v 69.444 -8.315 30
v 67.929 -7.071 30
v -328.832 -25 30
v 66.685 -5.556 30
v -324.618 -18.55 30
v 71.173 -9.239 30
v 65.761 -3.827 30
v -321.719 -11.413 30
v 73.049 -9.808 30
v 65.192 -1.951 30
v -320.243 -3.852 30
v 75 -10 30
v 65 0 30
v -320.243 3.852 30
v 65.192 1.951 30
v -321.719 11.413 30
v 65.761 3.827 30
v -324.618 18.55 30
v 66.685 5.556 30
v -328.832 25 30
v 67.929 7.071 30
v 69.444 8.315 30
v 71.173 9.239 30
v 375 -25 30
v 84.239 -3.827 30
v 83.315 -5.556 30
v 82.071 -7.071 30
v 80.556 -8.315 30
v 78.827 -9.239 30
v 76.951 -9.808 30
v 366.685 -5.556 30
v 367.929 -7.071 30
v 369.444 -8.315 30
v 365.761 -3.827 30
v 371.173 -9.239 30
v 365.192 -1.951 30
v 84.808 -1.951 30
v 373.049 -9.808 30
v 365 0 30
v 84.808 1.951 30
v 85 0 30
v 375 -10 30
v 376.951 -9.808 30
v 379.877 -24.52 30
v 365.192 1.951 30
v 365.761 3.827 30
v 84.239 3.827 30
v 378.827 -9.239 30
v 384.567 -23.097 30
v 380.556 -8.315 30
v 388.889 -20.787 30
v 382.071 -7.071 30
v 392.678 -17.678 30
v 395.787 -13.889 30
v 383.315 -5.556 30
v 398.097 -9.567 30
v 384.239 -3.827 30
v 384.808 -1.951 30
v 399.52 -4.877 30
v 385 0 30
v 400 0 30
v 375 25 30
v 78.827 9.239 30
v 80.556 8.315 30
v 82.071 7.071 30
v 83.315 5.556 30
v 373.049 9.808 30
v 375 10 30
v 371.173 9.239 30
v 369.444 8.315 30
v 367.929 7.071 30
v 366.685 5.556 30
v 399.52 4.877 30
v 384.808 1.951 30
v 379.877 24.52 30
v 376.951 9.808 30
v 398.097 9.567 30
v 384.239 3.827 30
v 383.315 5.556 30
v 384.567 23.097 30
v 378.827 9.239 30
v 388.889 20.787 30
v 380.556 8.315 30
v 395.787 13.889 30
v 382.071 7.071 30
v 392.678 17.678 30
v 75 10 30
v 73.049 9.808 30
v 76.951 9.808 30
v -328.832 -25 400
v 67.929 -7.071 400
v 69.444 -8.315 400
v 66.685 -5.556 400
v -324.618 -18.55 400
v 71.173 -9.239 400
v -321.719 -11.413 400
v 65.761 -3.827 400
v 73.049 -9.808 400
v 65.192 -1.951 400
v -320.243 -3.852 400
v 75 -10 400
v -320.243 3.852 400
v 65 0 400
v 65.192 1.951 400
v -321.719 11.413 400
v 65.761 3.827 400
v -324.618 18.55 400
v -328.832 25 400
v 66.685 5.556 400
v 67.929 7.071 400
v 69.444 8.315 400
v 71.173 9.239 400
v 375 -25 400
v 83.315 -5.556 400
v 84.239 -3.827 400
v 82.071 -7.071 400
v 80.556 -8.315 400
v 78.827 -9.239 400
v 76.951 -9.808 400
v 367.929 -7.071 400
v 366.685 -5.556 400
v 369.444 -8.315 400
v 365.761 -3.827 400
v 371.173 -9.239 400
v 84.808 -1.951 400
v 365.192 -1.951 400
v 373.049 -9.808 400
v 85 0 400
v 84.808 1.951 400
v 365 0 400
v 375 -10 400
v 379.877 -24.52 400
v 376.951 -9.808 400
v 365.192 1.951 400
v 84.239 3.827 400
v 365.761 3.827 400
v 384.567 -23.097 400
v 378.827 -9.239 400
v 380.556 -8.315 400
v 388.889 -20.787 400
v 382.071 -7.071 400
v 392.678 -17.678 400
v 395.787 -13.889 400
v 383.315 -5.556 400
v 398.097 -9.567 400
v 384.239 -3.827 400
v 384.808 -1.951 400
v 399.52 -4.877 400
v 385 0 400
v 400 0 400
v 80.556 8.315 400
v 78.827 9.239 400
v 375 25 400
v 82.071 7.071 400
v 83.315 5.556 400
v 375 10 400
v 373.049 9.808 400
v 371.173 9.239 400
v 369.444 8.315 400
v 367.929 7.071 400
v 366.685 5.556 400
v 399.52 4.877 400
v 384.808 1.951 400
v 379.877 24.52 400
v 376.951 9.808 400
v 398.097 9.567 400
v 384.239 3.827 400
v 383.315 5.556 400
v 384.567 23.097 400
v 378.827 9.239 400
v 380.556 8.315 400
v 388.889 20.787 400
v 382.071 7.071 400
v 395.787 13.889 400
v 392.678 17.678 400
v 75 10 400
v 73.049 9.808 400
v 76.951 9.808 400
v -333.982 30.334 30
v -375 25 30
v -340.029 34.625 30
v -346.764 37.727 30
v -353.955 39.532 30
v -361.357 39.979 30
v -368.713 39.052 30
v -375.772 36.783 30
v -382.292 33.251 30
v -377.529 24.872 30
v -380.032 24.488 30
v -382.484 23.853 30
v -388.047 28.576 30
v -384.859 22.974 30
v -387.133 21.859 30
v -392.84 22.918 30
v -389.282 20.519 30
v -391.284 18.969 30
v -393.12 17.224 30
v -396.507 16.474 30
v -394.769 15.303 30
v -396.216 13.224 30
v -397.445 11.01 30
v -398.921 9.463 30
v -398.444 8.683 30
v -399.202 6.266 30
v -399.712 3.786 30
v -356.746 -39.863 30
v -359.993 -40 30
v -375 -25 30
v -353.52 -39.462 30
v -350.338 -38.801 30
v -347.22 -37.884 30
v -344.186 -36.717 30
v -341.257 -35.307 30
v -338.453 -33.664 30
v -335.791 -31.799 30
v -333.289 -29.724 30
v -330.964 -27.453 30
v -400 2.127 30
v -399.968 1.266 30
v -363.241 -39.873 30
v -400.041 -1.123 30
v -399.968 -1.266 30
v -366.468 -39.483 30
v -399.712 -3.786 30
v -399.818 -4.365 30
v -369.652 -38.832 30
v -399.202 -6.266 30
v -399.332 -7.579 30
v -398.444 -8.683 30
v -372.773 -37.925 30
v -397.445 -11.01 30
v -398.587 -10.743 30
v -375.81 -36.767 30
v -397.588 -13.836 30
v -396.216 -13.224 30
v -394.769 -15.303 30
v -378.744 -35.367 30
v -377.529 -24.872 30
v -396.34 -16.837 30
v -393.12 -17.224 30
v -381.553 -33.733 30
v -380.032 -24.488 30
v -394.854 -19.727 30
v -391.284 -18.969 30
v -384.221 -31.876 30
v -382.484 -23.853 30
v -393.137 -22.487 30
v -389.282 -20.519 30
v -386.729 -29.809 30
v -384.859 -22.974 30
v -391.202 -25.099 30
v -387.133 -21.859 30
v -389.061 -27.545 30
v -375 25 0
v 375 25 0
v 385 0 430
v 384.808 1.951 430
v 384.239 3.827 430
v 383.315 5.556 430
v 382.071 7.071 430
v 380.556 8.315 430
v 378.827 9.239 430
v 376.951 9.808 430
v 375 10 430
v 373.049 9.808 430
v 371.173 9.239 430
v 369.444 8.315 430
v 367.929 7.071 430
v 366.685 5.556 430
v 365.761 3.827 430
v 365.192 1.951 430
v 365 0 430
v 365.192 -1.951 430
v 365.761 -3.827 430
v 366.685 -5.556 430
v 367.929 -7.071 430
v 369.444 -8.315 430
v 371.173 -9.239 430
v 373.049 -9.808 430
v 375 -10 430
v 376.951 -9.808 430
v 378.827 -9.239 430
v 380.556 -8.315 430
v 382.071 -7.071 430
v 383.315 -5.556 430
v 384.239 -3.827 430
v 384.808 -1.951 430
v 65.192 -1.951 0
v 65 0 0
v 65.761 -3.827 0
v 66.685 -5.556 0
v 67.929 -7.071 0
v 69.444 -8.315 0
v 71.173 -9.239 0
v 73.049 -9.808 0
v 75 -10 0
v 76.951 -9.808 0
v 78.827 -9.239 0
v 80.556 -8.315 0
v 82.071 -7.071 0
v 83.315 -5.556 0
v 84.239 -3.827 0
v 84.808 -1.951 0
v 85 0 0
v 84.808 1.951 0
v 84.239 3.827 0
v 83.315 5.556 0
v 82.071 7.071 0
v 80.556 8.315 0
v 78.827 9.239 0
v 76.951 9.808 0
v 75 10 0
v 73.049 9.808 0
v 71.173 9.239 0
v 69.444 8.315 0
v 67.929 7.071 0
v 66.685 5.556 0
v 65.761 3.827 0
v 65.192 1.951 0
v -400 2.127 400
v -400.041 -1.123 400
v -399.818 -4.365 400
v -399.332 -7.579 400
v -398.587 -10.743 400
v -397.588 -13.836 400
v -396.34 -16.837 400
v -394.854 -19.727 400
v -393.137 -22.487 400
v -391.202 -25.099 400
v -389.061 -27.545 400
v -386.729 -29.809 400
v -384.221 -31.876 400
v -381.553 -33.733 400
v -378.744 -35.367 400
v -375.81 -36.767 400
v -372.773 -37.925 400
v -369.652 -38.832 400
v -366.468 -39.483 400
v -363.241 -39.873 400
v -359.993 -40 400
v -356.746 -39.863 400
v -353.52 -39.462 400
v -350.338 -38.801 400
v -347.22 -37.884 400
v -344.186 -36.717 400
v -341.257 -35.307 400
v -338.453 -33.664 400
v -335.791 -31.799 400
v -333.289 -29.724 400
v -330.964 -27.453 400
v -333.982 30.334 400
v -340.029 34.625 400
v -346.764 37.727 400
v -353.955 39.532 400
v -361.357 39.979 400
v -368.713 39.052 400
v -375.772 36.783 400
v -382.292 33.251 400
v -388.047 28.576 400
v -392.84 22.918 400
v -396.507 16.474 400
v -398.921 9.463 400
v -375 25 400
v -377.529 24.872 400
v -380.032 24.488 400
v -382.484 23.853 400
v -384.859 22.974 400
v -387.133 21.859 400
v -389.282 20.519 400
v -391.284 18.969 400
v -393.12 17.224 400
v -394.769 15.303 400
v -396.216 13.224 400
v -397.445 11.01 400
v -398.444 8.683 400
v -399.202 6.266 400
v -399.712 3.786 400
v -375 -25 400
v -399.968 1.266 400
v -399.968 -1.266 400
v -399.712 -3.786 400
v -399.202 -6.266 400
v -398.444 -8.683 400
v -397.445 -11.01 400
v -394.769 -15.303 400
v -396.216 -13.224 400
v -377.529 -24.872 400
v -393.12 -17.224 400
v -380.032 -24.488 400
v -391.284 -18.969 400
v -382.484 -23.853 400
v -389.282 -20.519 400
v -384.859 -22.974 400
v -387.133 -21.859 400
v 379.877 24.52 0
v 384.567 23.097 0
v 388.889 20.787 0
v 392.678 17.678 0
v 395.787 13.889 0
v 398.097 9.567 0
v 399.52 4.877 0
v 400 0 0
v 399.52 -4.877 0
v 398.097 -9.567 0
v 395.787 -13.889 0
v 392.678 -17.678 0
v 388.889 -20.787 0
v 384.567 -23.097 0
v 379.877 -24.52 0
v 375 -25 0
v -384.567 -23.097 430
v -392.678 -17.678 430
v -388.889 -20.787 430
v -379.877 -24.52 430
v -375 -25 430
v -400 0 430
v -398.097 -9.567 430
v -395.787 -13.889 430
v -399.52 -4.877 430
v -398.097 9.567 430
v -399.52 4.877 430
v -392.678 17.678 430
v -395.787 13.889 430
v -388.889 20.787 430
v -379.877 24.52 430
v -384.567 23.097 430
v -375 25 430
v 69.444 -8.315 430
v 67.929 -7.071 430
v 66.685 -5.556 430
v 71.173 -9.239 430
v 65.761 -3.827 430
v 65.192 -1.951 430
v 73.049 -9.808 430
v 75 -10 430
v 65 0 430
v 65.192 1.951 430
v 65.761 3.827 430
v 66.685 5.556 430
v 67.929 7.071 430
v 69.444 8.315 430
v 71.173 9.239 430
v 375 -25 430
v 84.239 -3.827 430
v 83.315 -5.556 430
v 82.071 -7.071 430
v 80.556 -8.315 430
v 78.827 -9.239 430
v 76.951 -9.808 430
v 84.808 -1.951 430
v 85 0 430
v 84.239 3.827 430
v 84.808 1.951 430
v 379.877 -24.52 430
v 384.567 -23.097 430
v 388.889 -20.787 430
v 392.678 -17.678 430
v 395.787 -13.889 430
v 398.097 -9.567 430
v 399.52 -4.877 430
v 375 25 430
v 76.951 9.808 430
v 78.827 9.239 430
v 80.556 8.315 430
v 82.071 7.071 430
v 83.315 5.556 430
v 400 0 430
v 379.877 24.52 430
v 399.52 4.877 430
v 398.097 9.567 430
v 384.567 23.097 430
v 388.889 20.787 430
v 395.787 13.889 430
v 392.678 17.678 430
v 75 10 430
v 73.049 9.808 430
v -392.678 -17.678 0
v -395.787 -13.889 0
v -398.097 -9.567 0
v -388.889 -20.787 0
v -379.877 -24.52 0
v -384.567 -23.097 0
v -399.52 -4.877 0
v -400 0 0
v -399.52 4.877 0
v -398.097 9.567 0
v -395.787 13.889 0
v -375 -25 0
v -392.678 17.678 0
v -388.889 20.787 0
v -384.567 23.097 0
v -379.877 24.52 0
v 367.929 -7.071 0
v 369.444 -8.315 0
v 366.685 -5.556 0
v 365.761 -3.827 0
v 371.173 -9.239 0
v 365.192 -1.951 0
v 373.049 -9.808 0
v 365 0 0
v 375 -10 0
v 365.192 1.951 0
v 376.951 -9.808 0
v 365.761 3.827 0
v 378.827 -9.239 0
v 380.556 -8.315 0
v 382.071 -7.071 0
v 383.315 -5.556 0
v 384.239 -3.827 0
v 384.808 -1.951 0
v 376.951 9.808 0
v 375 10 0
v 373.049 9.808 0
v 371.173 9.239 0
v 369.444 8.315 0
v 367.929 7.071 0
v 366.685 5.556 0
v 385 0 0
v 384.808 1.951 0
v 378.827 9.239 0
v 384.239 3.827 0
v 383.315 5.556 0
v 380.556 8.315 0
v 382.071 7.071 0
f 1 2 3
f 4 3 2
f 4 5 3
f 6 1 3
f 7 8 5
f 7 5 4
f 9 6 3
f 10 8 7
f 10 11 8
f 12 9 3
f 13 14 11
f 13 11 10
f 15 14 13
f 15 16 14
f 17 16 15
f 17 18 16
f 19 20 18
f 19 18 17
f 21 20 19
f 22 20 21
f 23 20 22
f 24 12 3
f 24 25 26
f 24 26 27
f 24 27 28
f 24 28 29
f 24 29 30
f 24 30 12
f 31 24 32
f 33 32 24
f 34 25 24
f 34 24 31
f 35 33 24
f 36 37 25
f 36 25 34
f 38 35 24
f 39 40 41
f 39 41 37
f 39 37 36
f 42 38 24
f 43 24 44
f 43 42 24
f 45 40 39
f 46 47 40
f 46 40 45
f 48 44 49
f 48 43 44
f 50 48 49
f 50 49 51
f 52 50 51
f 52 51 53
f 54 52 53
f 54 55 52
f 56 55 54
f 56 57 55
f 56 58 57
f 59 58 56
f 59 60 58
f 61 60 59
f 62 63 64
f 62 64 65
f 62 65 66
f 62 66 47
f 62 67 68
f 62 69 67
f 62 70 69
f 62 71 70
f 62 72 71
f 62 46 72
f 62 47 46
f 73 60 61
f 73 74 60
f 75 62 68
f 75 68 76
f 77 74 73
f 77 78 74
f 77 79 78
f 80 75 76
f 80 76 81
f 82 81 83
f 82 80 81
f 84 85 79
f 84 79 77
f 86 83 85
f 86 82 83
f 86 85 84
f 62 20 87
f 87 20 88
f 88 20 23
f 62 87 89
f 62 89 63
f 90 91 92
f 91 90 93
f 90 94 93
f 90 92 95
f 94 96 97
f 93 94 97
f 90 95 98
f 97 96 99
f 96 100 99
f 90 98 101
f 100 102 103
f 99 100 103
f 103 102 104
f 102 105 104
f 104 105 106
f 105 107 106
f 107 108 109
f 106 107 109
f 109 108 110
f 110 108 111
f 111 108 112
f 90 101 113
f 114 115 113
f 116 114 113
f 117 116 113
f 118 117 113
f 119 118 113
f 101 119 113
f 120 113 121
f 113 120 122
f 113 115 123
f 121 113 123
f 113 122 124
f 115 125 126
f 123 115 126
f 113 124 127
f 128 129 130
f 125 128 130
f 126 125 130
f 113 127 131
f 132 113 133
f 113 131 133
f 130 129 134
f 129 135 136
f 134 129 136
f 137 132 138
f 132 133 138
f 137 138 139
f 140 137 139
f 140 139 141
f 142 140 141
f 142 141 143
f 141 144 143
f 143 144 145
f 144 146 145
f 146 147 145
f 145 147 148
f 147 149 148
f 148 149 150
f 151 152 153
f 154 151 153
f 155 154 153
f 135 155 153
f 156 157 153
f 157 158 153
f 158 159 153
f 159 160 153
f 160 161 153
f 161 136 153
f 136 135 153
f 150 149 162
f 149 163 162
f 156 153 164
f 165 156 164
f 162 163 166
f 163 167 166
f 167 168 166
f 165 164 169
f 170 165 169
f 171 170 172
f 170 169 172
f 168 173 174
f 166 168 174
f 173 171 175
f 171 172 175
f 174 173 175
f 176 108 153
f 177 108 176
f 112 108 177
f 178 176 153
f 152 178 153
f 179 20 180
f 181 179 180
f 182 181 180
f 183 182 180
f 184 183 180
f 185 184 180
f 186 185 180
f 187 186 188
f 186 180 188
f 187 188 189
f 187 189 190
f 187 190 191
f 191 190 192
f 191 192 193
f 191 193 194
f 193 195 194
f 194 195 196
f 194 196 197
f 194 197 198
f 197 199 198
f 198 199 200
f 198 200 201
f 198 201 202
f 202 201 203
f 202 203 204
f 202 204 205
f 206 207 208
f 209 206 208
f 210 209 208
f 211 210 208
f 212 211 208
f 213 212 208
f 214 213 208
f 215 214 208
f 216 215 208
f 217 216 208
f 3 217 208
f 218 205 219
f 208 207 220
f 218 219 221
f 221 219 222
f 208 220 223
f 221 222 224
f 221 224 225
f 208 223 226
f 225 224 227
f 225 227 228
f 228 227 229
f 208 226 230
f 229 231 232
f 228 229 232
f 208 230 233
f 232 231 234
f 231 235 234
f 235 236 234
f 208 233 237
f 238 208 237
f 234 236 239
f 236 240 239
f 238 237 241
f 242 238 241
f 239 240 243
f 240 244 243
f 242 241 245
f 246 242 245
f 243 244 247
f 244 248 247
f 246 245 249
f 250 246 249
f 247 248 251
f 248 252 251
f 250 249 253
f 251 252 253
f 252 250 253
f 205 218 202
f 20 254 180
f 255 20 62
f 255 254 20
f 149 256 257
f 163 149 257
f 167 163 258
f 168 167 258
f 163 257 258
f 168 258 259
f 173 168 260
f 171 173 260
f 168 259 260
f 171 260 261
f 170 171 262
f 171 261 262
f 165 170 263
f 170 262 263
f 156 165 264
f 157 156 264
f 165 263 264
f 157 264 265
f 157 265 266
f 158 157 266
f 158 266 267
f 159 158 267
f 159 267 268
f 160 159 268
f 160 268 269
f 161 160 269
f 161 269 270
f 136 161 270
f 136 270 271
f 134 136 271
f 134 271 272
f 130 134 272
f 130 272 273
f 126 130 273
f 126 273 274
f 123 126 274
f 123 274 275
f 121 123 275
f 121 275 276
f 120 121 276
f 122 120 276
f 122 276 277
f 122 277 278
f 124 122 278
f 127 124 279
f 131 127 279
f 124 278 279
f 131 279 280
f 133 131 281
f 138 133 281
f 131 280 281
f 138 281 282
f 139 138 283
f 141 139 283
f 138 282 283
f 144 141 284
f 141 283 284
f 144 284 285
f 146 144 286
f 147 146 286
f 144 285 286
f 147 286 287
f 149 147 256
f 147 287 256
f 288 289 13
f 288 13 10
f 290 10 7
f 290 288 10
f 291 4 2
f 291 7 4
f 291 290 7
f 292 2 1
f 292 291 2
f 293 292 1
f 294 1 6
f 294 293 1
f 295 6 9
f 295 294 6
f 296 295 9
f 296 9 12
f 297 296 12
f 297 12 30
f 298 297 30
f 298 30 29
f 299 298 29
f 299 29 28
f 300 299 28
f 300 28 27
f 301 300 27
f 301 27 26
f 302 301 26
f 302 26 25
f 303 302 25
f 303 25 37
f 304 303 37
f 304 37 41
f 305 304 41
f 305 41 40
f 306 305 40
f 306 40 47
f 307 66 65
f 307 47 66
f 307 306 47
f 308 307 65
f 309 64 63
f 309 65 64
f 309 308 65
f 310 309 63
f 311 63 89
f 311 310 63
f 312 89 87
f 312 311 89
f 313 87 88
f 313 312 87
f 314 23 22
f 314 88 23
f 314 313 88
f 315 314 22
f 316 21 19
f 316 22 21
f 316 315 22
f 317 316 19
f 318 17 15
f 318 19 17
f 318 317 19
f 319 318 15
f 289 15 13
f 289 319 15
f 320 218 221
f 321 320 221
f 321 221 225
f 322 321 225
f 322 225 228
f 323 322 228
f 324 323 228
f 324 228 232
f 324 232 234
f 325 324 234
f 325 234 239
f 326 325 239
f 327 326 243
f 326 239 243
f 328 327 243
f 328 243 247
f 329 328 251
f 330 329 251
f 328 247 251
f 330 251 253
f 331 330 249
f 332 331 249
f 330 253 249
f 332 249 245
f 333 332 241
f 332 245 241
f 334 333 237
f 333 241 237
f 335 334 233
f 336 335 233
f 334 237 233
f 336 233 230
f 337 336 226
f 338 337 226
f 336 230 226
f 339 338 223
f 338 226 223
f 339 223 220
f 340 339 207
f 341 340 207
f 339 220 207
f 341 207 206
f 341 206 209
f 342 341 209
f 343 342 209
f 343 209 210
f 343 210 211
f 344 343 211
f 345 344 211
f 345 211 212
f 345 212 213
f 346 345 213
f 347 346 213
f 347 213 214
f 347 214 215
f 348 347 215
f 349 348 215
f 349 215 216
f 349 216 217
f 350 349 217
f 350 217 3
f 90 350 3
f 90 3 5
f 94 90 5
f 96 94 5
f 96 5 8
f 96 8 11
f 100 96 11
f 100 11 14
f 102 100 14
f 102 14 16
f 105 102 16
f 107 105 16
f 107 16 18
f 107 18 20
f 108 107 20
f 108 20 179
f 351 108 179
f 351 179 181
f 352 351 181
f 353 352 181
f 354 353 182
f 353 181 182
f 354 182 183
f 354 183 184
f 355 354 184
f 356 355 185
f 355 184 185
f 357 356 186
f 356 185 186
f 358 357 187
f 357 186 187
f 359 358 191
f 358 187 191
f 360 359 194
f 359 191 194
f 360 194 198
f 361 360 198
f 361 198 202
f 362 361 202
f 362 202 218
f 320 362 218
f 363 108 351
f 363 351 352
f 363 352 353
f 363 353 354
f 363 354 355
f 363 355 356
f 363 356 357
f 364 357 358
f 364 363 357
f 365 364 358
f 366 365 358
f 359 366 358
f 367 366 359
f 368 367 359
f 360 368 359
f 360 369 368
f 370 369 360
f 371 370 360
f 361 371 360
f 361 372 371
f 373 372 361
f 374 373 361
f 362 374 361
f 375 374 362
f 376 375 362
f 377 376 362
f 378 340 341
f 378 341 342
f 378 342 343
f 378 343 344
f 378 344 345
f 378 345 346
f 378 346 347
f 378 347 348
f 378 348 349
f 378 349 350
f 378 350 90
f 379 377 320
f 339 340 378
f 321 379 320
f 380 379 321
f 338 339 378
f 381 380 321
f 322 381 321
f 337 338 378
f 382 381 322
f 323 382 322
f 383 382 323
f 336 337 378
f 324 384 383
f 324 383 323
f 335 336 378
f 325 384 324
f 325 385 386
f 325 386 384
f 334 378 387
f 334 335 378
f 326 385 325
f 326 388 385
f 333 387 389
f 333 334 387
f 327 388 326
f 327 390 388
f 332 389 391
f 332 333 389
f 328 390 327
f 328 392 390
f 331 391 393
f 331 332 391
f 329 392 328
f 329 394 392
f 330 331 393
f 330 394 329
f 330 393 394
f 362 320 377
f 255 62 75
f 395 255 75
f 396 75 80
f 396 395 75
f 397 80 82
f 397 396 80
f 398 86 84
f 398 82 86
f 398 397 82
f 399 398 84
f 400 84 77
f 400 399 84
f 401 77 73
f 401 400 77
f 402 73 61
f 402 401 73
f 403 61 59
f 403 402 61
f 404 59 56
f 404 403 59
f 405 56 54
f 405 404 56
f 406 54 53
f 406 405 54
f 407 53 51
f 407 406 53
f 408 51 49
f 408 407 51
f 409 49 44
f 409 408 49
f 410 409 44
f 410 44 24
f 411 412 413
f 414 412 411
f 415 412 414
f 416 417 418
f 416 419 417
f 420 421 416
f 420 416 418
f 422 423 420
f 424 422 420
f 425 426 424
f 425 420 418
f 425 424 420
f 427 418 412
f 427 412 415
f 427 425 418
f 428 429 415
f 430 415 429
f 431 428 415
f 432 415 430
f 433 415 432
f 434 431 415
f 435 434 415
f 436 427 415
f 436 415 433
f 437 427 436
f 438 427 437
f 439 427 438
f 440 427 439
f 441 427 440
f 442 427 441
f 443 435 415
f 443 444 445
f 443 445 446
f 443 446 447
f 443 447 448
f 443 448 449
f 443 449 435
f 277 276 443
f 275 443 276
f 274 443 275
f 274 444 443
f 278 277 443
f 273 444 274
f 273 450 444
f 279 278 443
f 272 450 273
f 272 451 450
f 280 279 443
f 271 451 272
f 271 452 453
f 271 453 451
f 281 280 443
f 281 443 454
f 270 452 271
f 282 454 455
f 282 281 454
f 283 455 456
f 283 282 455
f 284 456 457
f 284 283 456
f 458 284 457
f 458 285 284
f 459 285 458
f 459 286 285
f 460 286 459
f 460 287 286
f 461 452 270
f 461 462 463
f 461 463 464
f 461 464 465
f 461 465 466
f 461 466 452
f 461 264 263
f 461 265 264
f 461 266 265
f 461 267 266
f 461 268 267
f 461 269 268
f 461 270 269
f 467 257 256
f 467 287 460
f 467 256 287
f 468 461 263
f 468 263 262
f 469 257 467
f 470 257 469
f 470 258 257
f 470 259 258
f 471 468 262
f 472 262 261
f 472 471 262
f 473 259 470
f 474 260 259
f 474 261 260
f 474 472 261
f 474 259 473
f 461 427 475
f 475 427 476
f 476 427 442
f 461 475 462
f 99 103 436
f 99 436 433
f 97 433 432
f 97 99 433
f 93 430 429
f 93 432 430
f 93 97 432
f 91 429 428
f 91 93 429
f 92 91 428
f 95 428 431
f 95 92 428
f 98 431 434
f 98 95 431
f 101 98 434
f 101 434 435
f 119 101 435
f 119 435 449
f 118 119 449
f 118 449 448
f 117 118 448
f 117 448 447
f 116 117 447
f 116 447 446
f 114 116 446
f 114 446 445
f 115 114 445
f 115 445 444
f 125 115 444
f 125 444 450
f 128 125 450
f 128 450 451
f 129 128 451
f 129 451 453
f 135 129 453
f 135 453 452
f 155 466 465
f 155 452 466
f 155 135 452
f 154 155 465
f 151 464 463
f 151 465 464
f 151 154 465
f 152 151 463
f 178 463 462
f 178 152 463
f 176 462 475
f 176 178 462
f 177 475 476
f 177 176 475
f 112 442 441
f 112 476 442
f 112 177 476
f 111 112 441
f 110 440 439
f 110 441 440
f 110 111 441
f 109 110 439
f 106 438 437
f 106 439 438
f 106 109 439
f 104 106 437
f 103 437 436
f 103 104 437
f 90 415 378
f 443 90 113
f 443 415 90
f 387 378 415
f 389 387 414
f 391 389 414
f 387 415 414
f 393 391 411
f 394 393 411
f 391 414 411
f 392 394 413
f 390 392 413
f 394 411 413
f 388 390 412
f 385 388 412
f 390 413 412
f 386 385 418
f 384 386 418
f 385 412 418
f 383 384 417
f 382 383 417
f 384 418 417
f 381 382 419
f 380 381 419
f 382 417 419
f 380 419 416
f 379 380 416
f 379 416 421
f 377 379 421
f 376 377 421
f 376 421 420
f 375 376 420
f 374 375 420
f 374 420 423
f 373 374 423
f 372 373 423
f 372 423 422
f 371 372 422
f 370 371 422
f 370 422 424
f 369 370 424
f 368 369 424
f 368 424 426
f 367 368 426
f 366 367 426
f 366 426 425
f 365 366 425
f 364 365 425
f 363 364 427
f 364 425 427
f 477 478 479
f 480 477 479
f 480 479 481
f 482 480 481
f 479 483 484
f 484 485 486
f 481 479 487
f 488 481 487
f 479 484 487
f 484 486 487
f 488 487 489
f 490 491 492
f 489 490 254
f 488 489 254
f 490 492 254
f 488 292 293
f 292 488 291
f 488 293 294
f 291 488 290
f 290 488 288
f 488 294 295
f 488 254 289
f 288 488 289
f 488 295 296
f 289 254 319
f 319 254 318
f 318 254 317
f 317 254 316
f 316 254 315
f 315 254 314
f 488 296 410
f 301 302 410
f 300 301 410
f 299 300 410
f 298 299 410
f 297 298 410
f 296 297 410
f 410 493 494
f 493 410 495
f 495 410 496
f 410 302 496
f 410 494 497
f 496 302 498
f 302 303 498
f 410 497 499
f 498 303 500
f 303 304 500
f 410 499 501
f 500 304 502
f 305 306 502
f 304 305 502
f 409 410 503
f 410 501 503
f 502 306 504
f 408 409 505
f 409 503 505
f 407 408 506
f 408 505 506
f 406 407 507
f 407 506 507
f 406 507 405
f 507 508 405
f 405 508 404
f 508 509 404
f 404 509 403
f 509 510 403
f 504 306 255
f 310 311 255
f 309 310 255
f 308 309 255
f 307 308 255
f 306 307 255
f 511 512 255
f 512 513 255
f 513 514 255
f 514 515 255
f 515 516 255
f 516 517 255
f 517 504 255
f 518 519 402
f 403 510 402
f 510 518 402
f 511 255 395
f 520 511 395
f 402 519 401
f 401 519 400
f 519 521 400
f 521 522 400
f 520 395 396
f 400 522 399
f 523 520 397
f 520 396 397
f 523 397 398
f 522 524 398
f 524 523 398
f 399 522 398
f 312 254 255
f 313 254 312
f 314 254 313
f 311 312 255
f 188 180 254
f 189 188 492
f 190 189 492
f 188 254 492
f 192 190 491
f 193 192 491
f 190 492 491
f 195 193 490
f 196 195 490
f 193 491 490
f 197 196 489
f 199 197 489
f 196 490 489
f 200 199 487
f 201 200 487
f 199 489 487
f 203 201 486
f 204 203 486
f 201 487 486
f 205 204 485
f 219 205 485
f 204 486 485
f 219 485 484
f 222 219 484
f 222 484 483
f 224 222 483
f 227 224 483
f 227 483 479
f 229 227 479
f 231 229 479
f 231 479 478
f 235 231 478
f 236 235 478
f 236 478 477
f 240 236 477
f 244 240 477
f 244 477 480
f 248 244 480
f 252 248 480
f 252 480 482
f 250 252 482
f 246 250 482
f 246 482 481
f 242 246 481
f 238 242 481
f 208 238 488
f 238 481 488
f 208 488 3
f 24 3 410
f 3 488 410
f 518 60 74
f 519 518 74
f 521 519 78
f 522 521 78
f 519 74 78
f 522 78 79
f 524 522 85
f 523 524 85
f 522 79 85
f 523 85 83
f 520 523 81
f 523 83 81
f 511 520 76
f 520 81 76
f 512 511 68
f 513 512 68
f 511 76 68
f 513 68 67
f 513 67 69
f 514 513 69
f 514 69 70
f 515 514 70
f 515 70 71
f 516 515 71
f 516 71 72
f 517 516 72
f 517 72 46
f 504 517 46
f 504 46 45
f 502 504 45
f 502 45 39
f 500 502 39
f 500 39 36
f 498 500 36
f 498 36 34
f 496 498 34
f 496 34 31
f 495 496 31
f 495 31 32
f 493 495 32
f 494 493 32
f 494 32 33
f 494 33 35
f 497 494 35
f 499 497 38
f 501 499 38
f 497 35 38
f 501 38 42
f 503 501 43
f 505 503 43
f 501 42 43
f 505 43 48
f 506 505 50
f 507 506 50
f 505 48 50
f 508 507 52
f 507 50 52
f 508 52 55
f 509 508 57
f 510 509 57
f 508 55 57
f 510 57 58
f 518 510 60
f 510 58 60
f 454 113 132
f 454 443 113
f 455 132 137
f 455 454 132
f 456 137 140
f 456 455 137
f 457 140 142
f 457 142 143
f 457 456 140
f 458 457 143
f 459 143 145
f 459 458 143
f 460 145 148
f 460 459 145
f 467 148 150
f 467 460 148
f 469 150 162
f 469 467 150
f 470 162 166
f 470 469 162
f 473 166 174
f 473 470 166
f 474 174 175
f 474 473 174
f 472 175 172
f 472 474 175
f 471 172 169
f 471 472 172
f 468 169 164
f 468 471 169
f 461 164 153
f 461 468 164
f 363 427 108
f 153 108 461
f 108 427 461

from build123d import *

# Parameters (mm, degrees)
SKETCH1_W                   = 800
SKETCH1_H                   = 50
BOSS_EXTRUDE1_DEPTH         = 30
SKETCH2_R                   = 40
BOSS_EXTRUDE2_DEPTH         = 370
FILLET5_RADIUS              = 25
FILLET5_LENGTH              = 30
FILLET6_R                   = 25
FILLET5_OF_MIRROR3_2_RADIUS = 25
FILLET5_OF_MIRROR3_2_LENGTH = 30
FILLET6_OF_MIRROR3_R        = 25
CUT_EXTRUDE3_DEPTH          = 589.680979382
CUT_EXTRUDE3_DEPTH_BACK     = 589.680979382
SKETCH5_R                   = 10
SKETCH6_R                   = 10
CUT_EXTRUDE4_DEPTH          = 589.680979382


with BuildPart() as part:
    # Sketch1 → Boss-Extrude1 (new body)
    with BuildSketch(Plane.XY):
        Rectangle(SKETCH1_W, SKETCH1_H)
    boss_extrude1 = extrude(amount=BOSS_EXTRUDE1_DEPTH)

    # Sketch2 → Boss-Extrude2 (add)
    with BuildSketch(Plane.XY.offset(30)):
        with Locations(Location((-360.056615351, 0, 0), (0, 0, 176.951220784))):
            Circle(SKETCH2_R)
    extrude(amount=BOSS_EXTRUDE2_DEPTH)

    # Fillet5: full round fillet: the end face becomes a half cylinder, R = half its width
    fillet5_face = Plane((400, 0, 15), x_dir=(0, 0, -1), z_dir=(1, 0, 0))  # on the end face: x along it, z out of the body
    fillet5_slab = fillet5_face.offset(-FILLET5_RADIUS / 2) * Box(FILLET5_LENGTH, 2 * FILLET5_RADIUS, FILLET5_RADIUS, mode=Mode.PRIVATE)  # the body's end, R deep
    fillet5_round = Plane((375, 0, 15), x_dir=(1, 0, 0), z_dir=(0, 0, -1)) * Cylinder(FILLET5_RADIUS, FILLET5_LENGTH, mode=Mode.PRIVATE)  # its axis R under the face
    add(fillet5_slab - fillet5_round, mode=Mode.SUBTRACT)

    # Fillet6
    # the kernel refuses this fillet: 25 mm, written as the material it takes off along each edge
    with BuildSketch(Plane(origin=(-400, -25, -62.5), x_dir=(0, 1, 0), z_dir=(0, 0, 1)), Plane(origin=(-400, 25, -62.5), x_dir=(1, 0, 0), z_dir=(0, 0, 1))) as fillet6_piece_1:
        with BuildLine():
            CenterArc((FILLET6_R, -FILLET6_R), FILLET6_R, 90, 90)
            Line((0, -FILLET6_R), (0, 0))
            Line((0, 0), (FILLET6_R, 0))
        make_face()
    extrude(amount=92.5, mode=Mode.SUBTRACT)

    # Mirror3: Boss-Extrude1 across plane
    add(boss_extrude1.mirror(Plane.XY.offset(215)))

    # Fillet5 of Mirror3 2: full round fillet: the end face becomes a half cylinder, R = half its width
    fillet5_of_mirror3_2_face = Plane((400, 0, 415), x_dir=(0, 0, 1), z_dir=(1, 0, 0))  # on the end face: x along it, z out of the body
    fillet5_of_mirror3_2_slab = fillet5_of_mirror3_2_face.offset(-FILLET5_OF_MIRROR3_2_RADIUS / 2) * Box(FILLET5_OF_MIRROR3_2_LENGTH, 2 * FILLET5_OF_MIRROR3_2_RADIUS, FILLET5_OF_MIRROR3_2_RADIUS, mode=Mode.PRIVATE)  # the body's end, R deep
    fillet5_of_mirror3_2_round = Plane((375, 0, 415), x_dir=(1, 0, 0), z_dir=(0, 0, 1)) * Cylinder(FILLET5_OF_MIRROR3_2_RADIUS, FILLET5_OF_MIRROR3_2_LENGTH, mode=Mode.PRIVATE)  # its axis R under the face
    add(fillet5_of_mirror3_2_slab - fillet5_of_mirror3_2_round, mode=Mode.SUBTRACT)

    # Fillet6 of Mirror3
    # the kernel refuses this fillet: 25 mm, written as the material it takes off along each edge
    with BuildSketch(Plane(origin=(-400, -25, 492.5), x_dir=(0, 1, 0), z_dir=(0, 0, -1))) as fillet6_of_mirror3_piece_1:
        with BuildLine():
            CenterArc((FILLET6_OF_MIRROR3_R, FILLET6_OF_MIRROR3_R), FILLET6_OF_MIRROR3_R, 180, 90)
            Line((0, FILLET6_OF_MIRROR3_R), (0, 0))
            Line((0, 0), (FILLET6_OF_MIRROR3_R, 0))
        make_face()
    extrude(amount=92.5, mode=Mode.SUBTRACT)
    with BuildSketch(Plane(origin=(-400, 25, 492.5), x_dir=(0, -1, 0), z_dir=(0, 0, -1))) as fillet6_of_mirror3_piece_2:
        with BuildLine():
            CenterArc((FILLET6_OF_MIRROR3_R, -FILLET6_OF_MIRROR3_R), FILLET6_OF_MIRROR3_R, 90, 90)
            Line((0, -FILLET6_OF_MIRROR3_R), (0, 0))
            Line((0, 0), (FILLET6_OF_MIRROR3_R, 0))
        make_face()
    extrude(amount=92.5, mode=Mode.SUBTRACT)

    # Sketch5 → Cut-Extrude3 (cut, two sides: drawn at the far end of the back side and taken through both)
    with BuildSketch(Plane.XY.offset(430).offset(-CUT_EXTRUDE3_DEPTH_BACK)):
        with Locations(Location((75, 0, 0), (0, 0, 180))):
            Circle(SKETCH5_R)
    extrude(amount=CUT_EXTRUDE3_DEPTH + CUT_EXTRUDE3_DEPTH_BACK, mode=Mode.SUBTRACT)

    # Sketch6 → Cut-Extrude4 (cut, through all)
    with BuildSketch(Plane.XY.offset(430)):
        with Locations((375, 0)):
            Circle(SKETCH6_R)
    extrude(amount=-CUT_EXTRUDE4_DEPTH, mode=Mode.SUBTRACT)


solid = part.part
